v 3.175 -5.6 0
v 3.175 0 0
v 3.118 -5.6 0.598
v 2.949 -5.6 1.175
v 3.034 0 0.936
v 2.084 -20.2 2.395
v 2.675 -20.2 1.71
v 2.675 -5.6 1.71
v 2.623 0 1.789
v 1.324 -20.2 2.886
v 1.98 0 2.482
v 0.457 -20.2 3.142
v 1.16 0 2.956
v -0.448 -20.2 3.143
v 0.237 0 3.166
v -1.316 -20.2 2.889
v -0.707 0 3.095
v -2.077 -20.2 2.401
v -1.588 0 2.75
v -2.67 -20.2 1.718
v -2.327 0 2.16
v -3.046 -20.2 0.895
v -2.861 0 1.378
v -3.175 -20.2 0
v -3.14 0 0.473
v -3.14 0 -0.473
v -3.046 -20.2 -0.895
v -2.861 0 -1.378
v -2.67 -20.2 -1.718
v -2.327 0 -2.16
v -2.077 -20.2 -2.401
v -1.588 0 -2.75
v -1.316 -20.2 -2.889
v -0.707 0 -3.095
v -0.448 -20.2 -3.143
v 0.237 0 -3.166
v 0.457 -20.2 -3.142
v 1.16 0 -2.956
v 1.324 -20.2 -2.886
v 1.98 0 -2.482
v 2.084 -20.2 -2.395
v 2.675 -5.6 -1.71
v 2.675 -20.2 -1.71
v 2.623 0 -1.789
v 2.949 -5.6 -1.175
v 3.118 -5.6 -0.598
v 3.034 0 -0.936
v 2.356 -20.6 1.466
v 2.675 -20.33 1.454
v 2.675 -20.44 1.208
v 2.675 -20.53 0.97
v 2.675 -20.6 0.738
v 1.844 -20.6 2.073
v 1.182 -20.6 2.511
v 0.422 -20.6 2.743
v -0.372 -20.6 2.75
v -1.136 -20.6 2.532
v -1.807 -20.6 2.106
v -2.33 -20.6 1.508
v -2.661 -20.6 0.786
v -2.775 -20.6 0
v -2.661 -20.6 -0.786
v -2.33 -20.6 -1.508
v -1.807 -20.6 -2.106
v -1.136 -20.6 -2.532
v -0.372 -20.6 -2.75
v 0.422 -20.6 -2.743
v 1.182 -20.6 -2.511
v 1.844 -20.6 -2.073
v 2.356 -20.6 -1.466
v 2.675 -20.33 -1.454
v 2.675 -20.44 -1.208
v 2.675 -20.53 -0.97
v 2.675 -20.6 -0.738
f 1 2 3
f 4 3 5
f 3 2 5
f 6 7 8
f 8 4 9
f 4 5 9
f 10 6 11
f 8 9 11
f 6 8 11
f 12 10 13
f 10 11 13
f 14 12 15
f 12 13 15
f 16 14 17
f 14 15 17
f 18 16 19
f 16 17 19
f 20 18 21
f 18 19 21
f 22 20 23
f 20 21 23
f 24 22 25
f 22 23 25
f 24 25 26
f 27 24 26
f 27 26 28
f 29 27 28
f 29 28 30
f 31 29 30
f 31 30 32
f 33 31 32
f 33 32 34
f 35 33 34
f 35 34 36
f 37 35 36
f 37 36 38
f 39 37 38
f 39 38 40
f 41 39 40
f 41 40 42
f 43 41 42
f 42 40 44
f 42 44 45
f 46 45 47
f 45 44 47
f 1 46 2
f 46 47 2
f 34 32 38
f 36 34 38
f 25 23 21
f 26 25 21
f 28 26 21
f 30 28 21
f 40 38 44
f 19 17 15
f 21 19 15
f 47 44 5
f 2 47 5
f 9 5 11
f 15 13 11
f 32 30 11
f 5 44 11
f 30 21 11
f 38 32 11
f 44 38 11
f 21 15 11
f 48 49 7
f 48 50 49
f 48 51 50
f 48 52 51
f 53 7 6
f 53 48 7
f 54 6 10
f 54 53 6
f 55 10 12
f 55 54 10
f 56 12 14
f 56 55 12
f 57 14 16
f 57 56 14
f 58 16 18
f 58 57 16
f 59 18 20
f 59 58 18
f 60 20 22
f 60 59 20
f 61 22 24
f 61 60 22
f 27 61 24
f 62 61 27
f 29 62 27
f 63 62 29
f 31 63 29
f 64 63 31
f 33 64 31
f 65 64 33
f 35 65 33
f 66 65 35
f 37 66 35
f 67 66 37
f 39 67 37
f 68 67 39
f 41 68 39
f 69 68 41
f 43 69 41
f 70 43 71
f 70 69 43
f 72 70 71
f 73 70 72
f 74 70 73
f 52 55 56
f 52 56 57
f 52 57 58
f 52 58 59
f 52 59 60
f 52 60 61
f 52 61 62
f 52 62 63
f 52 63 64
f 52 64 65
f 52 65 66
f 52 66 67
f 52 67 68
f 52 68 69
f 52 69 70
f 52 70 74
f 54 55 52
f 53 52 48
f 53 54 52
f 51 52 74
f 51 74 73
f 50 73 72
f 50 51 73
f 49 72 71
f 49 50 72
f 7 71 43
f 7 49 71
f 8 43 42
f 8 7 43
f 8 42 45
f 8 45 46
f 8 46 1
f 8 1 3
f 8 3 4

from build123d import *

# Parameters (mm, degrees)
SKETCH015_R          = 3.175
PAD009_DEPTH         = 20.6
SKETCH016_W          = 0.5
SKETCH016_H          = 15
POCKET008_DEPTH      = 3.176
POCKET008_DEPTH_BACK = 3.176
CHAMFER_SIZE         = 0.4


with BuildPart() as part:
    # Sketch015 → Pad009 (new body)
    with BuildSketch(Plane.XZ):
        Circle(SKETCH015_R)
    extrude(amount=PAD009_DEPTH)

    # Sketch016 → Pocket008 (cut, two sides)
    with BuildSketch(Plane.XY) as pocket008_sk:
        with Locations((2.925, -13.1)):
            Rectangle(SKETCH016_W, SKETCH016_H)
    extrude(amount=-POCKET008_DEPTH, mode=Mode.SUBTRACT)
    extrude(pocket008_sk.sketch, amount=POCKET008_DEPTH_BACK, mode=Mode.SUBTRACT)

    # Chamfer
    chamfer_edges = [part.edges().sort_by_distance(p)[0] for p in [
        (-3.175, -20.6, 0),
    ]]
    chamfer(chamfer_edges, length=CHAMFER_SIZE)


solid = part.part
